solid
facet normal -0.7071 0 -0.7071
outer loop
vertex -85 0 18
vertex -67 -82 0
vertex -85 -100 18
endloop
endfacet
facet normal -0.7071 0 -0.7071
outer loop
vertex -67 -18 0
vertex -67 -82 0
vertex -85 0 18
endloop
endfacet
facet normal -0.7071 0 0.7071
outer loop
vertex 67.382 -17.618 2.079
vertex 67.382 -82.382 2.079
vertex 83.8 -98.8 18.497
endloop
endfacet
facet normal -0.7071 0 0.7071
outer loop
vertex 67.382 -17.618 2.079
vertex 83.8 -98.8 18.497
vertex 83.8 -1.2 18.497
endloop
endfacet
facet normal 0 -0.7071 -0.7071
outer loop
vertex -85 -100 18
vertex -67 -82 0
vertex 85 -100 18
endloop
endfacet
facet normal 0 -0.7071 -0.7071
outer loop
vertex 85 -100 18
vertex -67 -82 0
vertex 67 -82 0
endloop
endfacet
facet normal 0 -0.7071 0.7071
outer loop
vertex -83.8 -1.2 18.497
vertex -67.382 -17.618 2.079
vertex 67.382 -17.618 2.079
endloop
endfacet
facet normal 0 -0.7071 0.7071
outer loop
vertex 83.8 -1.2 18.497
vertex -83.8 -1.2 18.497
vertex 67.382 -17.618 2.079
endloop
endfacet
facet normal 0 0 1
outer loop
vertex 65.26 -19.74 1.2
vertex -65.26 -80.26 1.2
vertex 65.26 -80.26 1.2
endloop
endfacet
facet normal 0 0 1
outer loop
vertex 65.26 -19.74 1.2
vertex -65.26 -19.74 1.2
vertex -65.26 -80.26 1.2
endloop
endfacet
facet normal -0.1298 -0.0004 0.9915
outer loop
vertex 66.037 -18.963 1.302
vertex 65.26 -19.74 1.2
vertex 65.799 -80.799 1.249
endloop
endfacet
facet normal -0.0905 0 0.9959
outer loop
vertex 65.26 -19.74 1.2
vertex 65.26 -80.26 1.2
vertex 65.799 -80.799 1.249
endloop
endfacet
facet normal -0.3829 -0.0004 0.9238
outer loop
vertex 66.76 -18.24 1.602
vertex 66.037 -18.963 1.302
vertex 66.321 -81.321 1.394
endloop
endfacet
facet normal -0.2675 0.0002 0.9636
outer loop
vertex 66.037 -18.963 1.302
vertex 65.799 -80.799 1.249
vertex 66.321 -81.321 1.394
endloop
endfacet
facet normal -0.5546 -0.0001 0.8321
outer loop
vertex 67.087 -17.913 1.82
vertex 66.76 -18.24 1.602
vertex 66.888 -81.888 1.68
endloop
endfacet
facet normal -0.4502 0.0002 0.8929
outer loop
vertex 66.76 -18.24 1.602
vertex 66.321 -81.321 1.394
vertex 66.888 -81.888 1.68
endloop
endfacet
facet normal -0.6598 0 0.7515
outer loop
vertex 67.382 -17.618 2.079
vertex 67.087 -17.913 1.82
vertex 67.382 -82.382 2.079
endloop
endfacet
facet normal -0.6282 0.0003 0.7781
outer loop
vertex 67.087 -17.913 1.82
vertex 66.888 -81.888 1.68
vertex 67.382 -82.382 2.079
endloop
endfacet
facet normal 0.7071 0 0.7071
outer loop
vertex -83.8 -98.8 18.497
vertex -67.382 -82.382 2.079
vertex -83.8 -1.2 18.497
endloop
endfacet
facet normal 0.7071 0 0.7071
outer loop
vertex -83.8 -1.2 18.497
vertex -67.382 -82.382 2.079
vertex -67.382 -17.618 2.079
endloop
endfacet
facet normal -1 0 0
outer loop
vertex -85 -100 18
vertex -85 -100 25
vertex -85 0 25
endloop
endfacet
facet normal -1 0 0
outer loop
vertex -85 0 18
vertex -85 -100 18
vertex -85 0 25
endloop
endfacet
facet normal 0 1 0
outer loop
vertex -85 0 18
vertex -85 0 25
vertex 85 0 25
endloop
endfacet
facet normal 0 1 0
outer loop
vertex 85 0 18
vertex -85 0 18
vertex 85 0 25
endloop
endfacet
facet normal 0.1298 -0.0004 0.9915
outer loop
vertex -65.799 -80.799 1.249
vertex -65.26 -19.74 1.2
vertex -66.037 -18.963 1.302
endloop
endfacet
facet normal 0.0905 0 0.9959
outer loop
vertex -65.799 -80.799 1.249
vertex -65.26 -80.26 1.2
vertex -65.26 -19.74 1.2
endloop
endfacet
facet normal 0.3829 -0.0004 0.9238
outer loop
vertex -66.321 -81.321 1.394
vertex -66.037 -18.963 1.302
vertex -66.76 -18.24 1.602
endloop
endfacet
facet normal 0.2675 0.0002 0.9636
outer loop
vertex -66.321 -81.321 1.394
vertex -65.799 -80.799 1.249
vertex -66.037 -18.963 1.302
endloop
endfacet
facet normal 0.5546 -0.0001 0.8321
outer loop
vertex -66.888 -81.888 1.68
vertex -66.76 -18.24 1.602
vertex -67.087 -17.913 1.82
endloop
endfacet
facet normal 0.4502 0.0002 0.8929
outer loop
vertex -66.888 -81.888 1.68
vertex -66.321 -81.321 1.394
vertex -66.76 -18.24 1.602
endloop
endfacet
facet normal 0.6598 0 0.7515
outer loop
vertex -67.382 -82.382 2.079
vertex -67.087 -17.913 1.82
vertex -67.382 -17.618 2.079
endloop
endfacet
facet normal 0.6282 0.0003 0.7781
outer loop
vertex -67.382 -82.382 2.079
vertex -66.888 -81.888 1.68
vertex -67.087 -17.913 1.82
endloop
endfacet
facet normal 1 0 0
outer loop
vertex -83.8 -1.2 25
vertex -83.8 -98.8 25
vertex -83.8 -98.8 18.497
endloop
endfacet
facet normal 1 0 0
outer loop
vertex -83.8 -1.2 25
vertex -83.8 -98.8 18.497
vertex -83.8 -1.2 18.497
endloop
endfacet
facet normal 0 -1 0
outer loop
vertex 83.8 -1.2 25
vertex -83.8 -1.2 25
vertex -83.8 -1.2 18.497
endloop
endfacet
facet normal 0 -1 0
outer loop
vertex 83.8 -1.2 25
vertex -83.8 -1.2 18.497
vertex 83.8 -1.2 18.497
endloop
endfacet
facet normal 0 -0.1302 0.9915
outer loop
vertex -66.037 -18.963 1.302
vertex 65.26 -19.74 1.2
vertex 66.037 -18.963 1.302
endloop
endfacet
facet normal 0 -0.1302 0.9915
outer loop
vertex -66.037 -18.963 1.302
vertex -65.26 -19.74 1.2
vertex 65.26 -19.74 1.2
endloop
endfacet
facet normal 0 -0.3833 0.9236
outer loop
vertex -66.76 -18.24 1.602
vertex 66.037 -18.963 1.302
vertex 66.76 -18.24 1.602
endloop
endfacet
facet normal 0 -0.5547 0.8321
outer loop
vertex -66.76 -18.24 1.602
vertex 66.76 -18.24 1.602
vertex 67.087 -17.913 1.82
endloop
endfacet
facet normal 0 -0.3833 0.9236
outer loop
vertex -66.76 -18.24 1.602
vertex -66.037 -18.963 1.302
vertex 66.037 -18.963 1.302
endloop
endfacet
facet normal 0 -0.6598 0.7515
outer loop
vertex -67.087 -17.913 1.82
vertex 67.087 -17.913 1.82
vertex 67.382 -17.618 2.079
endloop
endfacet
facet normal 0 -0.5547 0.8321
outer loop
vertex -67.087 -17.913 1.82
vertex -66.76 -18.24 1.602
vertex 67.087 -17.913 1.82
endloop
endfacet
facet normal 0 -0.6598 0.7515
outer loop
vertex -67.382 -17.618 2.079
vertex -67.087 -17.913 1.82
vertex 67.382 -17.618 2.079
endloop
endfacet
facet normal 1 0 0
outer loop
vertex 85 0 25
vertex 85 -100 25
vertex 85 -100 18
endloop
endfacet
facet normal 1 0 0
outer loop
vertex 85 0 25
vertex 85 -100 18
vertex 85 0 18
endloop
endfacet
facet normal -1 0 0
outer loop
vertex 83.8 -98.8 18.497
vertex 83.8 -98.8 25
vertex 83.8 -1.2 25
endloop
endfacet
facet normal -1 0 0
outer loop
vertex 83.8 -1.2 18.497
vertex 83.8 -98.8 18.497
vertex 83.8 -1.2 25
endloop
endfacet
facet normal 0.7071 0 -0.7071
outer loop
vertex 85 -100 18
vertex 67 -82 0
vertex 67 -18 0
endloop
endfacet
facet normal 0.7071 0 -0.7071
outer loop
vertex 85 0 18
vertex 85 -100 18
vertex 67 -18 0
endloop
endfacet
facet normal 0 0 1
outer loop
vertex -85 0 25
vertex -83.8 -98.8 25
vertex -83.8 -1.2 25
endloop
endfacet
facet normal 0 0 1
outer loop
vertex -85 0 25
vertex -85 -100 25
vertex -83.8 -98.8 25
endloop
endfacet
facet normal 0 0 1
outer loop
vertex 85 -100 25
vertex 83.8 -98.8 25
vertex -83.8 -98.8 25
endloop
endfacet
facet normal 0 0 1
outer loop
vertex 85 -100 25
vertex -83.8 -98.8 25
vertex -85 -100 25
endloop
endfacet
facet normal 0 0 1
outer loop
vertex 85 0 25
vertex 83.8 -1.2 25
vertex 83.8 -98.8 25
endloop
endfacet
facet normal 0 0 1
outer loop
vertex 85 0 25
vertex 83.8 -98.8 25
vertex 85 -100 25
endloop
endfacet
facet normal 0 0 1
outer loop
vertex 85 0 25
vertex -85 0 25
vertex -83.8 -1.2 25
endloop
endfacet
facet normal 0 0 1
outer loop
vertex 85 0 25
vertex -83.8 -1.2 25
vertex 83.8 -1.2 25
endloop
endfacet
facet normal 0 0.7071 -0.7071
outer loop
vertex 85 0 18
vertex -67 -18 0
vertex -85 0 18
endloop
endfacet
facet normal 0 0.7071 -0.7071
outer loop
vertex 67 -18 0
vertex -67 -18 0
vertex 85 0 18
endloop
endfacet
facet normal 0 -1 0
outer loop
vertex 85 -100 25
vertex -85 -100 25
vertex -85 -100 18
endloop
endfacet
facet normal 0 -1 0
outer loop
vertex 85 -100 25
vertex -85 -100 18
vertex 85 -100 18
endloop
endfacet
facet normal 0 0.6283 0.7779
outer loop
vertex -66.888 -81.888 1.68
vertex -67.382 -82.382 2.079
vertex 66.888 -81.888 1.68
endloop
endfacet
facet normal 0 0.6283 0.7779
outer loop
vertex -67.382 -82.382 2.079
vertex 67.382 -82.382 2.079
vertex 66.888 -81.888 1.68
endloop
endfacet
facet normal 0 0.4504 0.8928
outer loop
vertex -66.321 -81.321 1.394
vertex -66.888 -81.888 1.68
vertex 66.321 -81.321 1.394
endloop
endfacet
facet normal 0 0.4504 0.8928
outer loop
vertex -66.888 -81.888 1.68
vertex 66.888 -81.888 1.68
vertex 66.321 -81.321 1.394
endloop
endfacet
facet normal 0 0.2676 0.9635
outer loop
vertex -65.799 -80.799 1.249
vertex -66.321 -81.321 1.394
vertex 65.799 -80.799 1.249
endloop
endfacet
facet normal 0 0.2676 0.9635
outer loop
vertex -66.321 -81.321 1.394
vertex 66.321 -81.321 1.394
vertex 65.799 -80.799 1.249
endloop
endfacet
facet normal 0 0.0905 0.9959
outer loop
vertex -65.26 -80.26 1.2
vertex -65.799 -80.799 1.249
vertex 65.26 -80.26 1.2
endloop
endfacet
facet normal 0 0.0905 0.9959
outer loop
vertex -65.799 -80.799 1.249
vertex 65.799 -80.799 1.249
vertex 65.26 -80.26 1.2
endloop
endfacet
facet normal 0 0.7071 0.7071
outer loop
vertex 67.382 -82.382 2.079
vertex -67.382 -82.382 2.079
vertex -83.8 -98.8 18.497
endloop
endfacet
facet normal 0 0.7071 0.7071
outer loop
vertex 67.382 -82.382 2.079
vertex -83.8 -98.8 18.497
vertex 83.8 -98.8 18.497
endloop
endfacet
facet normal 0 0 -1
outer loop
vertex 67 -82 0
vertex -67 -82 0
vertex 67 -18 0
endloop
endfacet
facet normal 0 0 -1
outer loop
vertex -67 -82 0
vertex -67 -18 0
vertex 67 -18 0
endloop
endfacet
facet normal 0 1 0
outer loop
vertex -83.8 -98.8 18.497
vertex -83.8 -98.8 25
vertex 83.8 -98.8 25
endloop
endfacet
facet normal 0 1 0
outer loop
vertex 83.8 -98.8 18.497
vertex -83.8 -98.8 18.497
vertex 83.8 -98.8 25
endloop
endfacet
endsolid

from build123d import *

# Parameters (mm, degrees)
F1_W     = 170
F1_H     = 100
F2_DEPTH = 25
F3_SIZE  = 18
F4_T     = -1.2
F5_R     = 3


with BuildPart() as f2:
    # F1 (on offset) → F2 (new body)
    with BuildSketch(Plane.XY.offset(25)):
        with Locations((0, -50)):
            Rectangle(F1_W, F1_H)
    extrude(amount=-F2_DEPTH)

    # F3
    f3_edges = [f2.edges().sort_by_distance(p)[0] for p in [
        (0, -100, 0),
        (85, -50, 0),
        (0, 0, 0),
        (-85, -50, 0),
    ]]
    chamfer(f3_edges, length=F3_SIZE)

    # F4
    f4_openings = [f2.faces().sort_by_distance(p)[0] for p in [
        (0, -50, 25),
    ]]
    offset(amount=F4_T, openings=f4_openings)

    # F5
    f5_edges = [f2.edges().sort_by_distance(p)[0] for p in [
        (0, -81.502944, 1.2),
        (66.502944, -50, 1.2),
        (0, -18.497056, 1.2),
        (-66.502944, -50, 1.2),
    ]]
    fillet(f5_edges, radius=F5_R)


solid = f2.part
